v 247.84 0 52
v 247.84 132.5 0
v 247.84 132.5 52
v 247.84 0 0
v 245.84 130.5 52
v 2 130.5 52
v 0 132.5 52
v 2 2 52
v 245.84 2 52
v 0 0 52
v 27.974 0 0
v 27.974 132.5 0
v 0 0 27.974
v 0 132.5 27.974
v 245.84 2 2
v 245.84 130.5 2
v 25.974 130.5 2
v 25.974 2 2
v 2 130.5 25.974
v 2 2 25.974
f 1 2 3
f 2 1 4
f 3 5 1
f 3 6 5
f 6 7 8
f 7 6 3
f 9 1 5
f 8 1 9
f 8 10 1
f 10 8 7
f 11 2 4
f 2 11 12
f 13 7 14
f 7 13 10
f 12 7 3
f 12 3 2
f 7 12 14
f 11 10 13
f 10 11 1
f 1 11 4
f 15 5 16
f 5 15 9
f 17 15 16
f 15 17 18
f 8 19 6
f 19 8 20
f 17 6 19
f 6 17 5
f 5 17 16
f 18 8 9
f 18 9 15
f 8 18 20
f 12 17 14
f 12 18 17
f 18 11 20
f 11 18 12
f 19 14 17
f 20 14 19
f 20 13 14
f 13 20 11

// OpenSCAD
U = 5.08;
H = 128.5;
D = 50;
W = 2;


difference() {

    cube([48 * U + 2 * W, H + 2 * W, D + W]);
  
    translate([W, W, W])
    cube([48 * U, H, D + W]);
    
    
    translate([-sqrt(8 * 8 * U * 2) - 2 * W, -1, 0])
    rotate([0, 45, 0])
    cube([8 * U, H + 2 * W + 2, 8 * U]);
}
